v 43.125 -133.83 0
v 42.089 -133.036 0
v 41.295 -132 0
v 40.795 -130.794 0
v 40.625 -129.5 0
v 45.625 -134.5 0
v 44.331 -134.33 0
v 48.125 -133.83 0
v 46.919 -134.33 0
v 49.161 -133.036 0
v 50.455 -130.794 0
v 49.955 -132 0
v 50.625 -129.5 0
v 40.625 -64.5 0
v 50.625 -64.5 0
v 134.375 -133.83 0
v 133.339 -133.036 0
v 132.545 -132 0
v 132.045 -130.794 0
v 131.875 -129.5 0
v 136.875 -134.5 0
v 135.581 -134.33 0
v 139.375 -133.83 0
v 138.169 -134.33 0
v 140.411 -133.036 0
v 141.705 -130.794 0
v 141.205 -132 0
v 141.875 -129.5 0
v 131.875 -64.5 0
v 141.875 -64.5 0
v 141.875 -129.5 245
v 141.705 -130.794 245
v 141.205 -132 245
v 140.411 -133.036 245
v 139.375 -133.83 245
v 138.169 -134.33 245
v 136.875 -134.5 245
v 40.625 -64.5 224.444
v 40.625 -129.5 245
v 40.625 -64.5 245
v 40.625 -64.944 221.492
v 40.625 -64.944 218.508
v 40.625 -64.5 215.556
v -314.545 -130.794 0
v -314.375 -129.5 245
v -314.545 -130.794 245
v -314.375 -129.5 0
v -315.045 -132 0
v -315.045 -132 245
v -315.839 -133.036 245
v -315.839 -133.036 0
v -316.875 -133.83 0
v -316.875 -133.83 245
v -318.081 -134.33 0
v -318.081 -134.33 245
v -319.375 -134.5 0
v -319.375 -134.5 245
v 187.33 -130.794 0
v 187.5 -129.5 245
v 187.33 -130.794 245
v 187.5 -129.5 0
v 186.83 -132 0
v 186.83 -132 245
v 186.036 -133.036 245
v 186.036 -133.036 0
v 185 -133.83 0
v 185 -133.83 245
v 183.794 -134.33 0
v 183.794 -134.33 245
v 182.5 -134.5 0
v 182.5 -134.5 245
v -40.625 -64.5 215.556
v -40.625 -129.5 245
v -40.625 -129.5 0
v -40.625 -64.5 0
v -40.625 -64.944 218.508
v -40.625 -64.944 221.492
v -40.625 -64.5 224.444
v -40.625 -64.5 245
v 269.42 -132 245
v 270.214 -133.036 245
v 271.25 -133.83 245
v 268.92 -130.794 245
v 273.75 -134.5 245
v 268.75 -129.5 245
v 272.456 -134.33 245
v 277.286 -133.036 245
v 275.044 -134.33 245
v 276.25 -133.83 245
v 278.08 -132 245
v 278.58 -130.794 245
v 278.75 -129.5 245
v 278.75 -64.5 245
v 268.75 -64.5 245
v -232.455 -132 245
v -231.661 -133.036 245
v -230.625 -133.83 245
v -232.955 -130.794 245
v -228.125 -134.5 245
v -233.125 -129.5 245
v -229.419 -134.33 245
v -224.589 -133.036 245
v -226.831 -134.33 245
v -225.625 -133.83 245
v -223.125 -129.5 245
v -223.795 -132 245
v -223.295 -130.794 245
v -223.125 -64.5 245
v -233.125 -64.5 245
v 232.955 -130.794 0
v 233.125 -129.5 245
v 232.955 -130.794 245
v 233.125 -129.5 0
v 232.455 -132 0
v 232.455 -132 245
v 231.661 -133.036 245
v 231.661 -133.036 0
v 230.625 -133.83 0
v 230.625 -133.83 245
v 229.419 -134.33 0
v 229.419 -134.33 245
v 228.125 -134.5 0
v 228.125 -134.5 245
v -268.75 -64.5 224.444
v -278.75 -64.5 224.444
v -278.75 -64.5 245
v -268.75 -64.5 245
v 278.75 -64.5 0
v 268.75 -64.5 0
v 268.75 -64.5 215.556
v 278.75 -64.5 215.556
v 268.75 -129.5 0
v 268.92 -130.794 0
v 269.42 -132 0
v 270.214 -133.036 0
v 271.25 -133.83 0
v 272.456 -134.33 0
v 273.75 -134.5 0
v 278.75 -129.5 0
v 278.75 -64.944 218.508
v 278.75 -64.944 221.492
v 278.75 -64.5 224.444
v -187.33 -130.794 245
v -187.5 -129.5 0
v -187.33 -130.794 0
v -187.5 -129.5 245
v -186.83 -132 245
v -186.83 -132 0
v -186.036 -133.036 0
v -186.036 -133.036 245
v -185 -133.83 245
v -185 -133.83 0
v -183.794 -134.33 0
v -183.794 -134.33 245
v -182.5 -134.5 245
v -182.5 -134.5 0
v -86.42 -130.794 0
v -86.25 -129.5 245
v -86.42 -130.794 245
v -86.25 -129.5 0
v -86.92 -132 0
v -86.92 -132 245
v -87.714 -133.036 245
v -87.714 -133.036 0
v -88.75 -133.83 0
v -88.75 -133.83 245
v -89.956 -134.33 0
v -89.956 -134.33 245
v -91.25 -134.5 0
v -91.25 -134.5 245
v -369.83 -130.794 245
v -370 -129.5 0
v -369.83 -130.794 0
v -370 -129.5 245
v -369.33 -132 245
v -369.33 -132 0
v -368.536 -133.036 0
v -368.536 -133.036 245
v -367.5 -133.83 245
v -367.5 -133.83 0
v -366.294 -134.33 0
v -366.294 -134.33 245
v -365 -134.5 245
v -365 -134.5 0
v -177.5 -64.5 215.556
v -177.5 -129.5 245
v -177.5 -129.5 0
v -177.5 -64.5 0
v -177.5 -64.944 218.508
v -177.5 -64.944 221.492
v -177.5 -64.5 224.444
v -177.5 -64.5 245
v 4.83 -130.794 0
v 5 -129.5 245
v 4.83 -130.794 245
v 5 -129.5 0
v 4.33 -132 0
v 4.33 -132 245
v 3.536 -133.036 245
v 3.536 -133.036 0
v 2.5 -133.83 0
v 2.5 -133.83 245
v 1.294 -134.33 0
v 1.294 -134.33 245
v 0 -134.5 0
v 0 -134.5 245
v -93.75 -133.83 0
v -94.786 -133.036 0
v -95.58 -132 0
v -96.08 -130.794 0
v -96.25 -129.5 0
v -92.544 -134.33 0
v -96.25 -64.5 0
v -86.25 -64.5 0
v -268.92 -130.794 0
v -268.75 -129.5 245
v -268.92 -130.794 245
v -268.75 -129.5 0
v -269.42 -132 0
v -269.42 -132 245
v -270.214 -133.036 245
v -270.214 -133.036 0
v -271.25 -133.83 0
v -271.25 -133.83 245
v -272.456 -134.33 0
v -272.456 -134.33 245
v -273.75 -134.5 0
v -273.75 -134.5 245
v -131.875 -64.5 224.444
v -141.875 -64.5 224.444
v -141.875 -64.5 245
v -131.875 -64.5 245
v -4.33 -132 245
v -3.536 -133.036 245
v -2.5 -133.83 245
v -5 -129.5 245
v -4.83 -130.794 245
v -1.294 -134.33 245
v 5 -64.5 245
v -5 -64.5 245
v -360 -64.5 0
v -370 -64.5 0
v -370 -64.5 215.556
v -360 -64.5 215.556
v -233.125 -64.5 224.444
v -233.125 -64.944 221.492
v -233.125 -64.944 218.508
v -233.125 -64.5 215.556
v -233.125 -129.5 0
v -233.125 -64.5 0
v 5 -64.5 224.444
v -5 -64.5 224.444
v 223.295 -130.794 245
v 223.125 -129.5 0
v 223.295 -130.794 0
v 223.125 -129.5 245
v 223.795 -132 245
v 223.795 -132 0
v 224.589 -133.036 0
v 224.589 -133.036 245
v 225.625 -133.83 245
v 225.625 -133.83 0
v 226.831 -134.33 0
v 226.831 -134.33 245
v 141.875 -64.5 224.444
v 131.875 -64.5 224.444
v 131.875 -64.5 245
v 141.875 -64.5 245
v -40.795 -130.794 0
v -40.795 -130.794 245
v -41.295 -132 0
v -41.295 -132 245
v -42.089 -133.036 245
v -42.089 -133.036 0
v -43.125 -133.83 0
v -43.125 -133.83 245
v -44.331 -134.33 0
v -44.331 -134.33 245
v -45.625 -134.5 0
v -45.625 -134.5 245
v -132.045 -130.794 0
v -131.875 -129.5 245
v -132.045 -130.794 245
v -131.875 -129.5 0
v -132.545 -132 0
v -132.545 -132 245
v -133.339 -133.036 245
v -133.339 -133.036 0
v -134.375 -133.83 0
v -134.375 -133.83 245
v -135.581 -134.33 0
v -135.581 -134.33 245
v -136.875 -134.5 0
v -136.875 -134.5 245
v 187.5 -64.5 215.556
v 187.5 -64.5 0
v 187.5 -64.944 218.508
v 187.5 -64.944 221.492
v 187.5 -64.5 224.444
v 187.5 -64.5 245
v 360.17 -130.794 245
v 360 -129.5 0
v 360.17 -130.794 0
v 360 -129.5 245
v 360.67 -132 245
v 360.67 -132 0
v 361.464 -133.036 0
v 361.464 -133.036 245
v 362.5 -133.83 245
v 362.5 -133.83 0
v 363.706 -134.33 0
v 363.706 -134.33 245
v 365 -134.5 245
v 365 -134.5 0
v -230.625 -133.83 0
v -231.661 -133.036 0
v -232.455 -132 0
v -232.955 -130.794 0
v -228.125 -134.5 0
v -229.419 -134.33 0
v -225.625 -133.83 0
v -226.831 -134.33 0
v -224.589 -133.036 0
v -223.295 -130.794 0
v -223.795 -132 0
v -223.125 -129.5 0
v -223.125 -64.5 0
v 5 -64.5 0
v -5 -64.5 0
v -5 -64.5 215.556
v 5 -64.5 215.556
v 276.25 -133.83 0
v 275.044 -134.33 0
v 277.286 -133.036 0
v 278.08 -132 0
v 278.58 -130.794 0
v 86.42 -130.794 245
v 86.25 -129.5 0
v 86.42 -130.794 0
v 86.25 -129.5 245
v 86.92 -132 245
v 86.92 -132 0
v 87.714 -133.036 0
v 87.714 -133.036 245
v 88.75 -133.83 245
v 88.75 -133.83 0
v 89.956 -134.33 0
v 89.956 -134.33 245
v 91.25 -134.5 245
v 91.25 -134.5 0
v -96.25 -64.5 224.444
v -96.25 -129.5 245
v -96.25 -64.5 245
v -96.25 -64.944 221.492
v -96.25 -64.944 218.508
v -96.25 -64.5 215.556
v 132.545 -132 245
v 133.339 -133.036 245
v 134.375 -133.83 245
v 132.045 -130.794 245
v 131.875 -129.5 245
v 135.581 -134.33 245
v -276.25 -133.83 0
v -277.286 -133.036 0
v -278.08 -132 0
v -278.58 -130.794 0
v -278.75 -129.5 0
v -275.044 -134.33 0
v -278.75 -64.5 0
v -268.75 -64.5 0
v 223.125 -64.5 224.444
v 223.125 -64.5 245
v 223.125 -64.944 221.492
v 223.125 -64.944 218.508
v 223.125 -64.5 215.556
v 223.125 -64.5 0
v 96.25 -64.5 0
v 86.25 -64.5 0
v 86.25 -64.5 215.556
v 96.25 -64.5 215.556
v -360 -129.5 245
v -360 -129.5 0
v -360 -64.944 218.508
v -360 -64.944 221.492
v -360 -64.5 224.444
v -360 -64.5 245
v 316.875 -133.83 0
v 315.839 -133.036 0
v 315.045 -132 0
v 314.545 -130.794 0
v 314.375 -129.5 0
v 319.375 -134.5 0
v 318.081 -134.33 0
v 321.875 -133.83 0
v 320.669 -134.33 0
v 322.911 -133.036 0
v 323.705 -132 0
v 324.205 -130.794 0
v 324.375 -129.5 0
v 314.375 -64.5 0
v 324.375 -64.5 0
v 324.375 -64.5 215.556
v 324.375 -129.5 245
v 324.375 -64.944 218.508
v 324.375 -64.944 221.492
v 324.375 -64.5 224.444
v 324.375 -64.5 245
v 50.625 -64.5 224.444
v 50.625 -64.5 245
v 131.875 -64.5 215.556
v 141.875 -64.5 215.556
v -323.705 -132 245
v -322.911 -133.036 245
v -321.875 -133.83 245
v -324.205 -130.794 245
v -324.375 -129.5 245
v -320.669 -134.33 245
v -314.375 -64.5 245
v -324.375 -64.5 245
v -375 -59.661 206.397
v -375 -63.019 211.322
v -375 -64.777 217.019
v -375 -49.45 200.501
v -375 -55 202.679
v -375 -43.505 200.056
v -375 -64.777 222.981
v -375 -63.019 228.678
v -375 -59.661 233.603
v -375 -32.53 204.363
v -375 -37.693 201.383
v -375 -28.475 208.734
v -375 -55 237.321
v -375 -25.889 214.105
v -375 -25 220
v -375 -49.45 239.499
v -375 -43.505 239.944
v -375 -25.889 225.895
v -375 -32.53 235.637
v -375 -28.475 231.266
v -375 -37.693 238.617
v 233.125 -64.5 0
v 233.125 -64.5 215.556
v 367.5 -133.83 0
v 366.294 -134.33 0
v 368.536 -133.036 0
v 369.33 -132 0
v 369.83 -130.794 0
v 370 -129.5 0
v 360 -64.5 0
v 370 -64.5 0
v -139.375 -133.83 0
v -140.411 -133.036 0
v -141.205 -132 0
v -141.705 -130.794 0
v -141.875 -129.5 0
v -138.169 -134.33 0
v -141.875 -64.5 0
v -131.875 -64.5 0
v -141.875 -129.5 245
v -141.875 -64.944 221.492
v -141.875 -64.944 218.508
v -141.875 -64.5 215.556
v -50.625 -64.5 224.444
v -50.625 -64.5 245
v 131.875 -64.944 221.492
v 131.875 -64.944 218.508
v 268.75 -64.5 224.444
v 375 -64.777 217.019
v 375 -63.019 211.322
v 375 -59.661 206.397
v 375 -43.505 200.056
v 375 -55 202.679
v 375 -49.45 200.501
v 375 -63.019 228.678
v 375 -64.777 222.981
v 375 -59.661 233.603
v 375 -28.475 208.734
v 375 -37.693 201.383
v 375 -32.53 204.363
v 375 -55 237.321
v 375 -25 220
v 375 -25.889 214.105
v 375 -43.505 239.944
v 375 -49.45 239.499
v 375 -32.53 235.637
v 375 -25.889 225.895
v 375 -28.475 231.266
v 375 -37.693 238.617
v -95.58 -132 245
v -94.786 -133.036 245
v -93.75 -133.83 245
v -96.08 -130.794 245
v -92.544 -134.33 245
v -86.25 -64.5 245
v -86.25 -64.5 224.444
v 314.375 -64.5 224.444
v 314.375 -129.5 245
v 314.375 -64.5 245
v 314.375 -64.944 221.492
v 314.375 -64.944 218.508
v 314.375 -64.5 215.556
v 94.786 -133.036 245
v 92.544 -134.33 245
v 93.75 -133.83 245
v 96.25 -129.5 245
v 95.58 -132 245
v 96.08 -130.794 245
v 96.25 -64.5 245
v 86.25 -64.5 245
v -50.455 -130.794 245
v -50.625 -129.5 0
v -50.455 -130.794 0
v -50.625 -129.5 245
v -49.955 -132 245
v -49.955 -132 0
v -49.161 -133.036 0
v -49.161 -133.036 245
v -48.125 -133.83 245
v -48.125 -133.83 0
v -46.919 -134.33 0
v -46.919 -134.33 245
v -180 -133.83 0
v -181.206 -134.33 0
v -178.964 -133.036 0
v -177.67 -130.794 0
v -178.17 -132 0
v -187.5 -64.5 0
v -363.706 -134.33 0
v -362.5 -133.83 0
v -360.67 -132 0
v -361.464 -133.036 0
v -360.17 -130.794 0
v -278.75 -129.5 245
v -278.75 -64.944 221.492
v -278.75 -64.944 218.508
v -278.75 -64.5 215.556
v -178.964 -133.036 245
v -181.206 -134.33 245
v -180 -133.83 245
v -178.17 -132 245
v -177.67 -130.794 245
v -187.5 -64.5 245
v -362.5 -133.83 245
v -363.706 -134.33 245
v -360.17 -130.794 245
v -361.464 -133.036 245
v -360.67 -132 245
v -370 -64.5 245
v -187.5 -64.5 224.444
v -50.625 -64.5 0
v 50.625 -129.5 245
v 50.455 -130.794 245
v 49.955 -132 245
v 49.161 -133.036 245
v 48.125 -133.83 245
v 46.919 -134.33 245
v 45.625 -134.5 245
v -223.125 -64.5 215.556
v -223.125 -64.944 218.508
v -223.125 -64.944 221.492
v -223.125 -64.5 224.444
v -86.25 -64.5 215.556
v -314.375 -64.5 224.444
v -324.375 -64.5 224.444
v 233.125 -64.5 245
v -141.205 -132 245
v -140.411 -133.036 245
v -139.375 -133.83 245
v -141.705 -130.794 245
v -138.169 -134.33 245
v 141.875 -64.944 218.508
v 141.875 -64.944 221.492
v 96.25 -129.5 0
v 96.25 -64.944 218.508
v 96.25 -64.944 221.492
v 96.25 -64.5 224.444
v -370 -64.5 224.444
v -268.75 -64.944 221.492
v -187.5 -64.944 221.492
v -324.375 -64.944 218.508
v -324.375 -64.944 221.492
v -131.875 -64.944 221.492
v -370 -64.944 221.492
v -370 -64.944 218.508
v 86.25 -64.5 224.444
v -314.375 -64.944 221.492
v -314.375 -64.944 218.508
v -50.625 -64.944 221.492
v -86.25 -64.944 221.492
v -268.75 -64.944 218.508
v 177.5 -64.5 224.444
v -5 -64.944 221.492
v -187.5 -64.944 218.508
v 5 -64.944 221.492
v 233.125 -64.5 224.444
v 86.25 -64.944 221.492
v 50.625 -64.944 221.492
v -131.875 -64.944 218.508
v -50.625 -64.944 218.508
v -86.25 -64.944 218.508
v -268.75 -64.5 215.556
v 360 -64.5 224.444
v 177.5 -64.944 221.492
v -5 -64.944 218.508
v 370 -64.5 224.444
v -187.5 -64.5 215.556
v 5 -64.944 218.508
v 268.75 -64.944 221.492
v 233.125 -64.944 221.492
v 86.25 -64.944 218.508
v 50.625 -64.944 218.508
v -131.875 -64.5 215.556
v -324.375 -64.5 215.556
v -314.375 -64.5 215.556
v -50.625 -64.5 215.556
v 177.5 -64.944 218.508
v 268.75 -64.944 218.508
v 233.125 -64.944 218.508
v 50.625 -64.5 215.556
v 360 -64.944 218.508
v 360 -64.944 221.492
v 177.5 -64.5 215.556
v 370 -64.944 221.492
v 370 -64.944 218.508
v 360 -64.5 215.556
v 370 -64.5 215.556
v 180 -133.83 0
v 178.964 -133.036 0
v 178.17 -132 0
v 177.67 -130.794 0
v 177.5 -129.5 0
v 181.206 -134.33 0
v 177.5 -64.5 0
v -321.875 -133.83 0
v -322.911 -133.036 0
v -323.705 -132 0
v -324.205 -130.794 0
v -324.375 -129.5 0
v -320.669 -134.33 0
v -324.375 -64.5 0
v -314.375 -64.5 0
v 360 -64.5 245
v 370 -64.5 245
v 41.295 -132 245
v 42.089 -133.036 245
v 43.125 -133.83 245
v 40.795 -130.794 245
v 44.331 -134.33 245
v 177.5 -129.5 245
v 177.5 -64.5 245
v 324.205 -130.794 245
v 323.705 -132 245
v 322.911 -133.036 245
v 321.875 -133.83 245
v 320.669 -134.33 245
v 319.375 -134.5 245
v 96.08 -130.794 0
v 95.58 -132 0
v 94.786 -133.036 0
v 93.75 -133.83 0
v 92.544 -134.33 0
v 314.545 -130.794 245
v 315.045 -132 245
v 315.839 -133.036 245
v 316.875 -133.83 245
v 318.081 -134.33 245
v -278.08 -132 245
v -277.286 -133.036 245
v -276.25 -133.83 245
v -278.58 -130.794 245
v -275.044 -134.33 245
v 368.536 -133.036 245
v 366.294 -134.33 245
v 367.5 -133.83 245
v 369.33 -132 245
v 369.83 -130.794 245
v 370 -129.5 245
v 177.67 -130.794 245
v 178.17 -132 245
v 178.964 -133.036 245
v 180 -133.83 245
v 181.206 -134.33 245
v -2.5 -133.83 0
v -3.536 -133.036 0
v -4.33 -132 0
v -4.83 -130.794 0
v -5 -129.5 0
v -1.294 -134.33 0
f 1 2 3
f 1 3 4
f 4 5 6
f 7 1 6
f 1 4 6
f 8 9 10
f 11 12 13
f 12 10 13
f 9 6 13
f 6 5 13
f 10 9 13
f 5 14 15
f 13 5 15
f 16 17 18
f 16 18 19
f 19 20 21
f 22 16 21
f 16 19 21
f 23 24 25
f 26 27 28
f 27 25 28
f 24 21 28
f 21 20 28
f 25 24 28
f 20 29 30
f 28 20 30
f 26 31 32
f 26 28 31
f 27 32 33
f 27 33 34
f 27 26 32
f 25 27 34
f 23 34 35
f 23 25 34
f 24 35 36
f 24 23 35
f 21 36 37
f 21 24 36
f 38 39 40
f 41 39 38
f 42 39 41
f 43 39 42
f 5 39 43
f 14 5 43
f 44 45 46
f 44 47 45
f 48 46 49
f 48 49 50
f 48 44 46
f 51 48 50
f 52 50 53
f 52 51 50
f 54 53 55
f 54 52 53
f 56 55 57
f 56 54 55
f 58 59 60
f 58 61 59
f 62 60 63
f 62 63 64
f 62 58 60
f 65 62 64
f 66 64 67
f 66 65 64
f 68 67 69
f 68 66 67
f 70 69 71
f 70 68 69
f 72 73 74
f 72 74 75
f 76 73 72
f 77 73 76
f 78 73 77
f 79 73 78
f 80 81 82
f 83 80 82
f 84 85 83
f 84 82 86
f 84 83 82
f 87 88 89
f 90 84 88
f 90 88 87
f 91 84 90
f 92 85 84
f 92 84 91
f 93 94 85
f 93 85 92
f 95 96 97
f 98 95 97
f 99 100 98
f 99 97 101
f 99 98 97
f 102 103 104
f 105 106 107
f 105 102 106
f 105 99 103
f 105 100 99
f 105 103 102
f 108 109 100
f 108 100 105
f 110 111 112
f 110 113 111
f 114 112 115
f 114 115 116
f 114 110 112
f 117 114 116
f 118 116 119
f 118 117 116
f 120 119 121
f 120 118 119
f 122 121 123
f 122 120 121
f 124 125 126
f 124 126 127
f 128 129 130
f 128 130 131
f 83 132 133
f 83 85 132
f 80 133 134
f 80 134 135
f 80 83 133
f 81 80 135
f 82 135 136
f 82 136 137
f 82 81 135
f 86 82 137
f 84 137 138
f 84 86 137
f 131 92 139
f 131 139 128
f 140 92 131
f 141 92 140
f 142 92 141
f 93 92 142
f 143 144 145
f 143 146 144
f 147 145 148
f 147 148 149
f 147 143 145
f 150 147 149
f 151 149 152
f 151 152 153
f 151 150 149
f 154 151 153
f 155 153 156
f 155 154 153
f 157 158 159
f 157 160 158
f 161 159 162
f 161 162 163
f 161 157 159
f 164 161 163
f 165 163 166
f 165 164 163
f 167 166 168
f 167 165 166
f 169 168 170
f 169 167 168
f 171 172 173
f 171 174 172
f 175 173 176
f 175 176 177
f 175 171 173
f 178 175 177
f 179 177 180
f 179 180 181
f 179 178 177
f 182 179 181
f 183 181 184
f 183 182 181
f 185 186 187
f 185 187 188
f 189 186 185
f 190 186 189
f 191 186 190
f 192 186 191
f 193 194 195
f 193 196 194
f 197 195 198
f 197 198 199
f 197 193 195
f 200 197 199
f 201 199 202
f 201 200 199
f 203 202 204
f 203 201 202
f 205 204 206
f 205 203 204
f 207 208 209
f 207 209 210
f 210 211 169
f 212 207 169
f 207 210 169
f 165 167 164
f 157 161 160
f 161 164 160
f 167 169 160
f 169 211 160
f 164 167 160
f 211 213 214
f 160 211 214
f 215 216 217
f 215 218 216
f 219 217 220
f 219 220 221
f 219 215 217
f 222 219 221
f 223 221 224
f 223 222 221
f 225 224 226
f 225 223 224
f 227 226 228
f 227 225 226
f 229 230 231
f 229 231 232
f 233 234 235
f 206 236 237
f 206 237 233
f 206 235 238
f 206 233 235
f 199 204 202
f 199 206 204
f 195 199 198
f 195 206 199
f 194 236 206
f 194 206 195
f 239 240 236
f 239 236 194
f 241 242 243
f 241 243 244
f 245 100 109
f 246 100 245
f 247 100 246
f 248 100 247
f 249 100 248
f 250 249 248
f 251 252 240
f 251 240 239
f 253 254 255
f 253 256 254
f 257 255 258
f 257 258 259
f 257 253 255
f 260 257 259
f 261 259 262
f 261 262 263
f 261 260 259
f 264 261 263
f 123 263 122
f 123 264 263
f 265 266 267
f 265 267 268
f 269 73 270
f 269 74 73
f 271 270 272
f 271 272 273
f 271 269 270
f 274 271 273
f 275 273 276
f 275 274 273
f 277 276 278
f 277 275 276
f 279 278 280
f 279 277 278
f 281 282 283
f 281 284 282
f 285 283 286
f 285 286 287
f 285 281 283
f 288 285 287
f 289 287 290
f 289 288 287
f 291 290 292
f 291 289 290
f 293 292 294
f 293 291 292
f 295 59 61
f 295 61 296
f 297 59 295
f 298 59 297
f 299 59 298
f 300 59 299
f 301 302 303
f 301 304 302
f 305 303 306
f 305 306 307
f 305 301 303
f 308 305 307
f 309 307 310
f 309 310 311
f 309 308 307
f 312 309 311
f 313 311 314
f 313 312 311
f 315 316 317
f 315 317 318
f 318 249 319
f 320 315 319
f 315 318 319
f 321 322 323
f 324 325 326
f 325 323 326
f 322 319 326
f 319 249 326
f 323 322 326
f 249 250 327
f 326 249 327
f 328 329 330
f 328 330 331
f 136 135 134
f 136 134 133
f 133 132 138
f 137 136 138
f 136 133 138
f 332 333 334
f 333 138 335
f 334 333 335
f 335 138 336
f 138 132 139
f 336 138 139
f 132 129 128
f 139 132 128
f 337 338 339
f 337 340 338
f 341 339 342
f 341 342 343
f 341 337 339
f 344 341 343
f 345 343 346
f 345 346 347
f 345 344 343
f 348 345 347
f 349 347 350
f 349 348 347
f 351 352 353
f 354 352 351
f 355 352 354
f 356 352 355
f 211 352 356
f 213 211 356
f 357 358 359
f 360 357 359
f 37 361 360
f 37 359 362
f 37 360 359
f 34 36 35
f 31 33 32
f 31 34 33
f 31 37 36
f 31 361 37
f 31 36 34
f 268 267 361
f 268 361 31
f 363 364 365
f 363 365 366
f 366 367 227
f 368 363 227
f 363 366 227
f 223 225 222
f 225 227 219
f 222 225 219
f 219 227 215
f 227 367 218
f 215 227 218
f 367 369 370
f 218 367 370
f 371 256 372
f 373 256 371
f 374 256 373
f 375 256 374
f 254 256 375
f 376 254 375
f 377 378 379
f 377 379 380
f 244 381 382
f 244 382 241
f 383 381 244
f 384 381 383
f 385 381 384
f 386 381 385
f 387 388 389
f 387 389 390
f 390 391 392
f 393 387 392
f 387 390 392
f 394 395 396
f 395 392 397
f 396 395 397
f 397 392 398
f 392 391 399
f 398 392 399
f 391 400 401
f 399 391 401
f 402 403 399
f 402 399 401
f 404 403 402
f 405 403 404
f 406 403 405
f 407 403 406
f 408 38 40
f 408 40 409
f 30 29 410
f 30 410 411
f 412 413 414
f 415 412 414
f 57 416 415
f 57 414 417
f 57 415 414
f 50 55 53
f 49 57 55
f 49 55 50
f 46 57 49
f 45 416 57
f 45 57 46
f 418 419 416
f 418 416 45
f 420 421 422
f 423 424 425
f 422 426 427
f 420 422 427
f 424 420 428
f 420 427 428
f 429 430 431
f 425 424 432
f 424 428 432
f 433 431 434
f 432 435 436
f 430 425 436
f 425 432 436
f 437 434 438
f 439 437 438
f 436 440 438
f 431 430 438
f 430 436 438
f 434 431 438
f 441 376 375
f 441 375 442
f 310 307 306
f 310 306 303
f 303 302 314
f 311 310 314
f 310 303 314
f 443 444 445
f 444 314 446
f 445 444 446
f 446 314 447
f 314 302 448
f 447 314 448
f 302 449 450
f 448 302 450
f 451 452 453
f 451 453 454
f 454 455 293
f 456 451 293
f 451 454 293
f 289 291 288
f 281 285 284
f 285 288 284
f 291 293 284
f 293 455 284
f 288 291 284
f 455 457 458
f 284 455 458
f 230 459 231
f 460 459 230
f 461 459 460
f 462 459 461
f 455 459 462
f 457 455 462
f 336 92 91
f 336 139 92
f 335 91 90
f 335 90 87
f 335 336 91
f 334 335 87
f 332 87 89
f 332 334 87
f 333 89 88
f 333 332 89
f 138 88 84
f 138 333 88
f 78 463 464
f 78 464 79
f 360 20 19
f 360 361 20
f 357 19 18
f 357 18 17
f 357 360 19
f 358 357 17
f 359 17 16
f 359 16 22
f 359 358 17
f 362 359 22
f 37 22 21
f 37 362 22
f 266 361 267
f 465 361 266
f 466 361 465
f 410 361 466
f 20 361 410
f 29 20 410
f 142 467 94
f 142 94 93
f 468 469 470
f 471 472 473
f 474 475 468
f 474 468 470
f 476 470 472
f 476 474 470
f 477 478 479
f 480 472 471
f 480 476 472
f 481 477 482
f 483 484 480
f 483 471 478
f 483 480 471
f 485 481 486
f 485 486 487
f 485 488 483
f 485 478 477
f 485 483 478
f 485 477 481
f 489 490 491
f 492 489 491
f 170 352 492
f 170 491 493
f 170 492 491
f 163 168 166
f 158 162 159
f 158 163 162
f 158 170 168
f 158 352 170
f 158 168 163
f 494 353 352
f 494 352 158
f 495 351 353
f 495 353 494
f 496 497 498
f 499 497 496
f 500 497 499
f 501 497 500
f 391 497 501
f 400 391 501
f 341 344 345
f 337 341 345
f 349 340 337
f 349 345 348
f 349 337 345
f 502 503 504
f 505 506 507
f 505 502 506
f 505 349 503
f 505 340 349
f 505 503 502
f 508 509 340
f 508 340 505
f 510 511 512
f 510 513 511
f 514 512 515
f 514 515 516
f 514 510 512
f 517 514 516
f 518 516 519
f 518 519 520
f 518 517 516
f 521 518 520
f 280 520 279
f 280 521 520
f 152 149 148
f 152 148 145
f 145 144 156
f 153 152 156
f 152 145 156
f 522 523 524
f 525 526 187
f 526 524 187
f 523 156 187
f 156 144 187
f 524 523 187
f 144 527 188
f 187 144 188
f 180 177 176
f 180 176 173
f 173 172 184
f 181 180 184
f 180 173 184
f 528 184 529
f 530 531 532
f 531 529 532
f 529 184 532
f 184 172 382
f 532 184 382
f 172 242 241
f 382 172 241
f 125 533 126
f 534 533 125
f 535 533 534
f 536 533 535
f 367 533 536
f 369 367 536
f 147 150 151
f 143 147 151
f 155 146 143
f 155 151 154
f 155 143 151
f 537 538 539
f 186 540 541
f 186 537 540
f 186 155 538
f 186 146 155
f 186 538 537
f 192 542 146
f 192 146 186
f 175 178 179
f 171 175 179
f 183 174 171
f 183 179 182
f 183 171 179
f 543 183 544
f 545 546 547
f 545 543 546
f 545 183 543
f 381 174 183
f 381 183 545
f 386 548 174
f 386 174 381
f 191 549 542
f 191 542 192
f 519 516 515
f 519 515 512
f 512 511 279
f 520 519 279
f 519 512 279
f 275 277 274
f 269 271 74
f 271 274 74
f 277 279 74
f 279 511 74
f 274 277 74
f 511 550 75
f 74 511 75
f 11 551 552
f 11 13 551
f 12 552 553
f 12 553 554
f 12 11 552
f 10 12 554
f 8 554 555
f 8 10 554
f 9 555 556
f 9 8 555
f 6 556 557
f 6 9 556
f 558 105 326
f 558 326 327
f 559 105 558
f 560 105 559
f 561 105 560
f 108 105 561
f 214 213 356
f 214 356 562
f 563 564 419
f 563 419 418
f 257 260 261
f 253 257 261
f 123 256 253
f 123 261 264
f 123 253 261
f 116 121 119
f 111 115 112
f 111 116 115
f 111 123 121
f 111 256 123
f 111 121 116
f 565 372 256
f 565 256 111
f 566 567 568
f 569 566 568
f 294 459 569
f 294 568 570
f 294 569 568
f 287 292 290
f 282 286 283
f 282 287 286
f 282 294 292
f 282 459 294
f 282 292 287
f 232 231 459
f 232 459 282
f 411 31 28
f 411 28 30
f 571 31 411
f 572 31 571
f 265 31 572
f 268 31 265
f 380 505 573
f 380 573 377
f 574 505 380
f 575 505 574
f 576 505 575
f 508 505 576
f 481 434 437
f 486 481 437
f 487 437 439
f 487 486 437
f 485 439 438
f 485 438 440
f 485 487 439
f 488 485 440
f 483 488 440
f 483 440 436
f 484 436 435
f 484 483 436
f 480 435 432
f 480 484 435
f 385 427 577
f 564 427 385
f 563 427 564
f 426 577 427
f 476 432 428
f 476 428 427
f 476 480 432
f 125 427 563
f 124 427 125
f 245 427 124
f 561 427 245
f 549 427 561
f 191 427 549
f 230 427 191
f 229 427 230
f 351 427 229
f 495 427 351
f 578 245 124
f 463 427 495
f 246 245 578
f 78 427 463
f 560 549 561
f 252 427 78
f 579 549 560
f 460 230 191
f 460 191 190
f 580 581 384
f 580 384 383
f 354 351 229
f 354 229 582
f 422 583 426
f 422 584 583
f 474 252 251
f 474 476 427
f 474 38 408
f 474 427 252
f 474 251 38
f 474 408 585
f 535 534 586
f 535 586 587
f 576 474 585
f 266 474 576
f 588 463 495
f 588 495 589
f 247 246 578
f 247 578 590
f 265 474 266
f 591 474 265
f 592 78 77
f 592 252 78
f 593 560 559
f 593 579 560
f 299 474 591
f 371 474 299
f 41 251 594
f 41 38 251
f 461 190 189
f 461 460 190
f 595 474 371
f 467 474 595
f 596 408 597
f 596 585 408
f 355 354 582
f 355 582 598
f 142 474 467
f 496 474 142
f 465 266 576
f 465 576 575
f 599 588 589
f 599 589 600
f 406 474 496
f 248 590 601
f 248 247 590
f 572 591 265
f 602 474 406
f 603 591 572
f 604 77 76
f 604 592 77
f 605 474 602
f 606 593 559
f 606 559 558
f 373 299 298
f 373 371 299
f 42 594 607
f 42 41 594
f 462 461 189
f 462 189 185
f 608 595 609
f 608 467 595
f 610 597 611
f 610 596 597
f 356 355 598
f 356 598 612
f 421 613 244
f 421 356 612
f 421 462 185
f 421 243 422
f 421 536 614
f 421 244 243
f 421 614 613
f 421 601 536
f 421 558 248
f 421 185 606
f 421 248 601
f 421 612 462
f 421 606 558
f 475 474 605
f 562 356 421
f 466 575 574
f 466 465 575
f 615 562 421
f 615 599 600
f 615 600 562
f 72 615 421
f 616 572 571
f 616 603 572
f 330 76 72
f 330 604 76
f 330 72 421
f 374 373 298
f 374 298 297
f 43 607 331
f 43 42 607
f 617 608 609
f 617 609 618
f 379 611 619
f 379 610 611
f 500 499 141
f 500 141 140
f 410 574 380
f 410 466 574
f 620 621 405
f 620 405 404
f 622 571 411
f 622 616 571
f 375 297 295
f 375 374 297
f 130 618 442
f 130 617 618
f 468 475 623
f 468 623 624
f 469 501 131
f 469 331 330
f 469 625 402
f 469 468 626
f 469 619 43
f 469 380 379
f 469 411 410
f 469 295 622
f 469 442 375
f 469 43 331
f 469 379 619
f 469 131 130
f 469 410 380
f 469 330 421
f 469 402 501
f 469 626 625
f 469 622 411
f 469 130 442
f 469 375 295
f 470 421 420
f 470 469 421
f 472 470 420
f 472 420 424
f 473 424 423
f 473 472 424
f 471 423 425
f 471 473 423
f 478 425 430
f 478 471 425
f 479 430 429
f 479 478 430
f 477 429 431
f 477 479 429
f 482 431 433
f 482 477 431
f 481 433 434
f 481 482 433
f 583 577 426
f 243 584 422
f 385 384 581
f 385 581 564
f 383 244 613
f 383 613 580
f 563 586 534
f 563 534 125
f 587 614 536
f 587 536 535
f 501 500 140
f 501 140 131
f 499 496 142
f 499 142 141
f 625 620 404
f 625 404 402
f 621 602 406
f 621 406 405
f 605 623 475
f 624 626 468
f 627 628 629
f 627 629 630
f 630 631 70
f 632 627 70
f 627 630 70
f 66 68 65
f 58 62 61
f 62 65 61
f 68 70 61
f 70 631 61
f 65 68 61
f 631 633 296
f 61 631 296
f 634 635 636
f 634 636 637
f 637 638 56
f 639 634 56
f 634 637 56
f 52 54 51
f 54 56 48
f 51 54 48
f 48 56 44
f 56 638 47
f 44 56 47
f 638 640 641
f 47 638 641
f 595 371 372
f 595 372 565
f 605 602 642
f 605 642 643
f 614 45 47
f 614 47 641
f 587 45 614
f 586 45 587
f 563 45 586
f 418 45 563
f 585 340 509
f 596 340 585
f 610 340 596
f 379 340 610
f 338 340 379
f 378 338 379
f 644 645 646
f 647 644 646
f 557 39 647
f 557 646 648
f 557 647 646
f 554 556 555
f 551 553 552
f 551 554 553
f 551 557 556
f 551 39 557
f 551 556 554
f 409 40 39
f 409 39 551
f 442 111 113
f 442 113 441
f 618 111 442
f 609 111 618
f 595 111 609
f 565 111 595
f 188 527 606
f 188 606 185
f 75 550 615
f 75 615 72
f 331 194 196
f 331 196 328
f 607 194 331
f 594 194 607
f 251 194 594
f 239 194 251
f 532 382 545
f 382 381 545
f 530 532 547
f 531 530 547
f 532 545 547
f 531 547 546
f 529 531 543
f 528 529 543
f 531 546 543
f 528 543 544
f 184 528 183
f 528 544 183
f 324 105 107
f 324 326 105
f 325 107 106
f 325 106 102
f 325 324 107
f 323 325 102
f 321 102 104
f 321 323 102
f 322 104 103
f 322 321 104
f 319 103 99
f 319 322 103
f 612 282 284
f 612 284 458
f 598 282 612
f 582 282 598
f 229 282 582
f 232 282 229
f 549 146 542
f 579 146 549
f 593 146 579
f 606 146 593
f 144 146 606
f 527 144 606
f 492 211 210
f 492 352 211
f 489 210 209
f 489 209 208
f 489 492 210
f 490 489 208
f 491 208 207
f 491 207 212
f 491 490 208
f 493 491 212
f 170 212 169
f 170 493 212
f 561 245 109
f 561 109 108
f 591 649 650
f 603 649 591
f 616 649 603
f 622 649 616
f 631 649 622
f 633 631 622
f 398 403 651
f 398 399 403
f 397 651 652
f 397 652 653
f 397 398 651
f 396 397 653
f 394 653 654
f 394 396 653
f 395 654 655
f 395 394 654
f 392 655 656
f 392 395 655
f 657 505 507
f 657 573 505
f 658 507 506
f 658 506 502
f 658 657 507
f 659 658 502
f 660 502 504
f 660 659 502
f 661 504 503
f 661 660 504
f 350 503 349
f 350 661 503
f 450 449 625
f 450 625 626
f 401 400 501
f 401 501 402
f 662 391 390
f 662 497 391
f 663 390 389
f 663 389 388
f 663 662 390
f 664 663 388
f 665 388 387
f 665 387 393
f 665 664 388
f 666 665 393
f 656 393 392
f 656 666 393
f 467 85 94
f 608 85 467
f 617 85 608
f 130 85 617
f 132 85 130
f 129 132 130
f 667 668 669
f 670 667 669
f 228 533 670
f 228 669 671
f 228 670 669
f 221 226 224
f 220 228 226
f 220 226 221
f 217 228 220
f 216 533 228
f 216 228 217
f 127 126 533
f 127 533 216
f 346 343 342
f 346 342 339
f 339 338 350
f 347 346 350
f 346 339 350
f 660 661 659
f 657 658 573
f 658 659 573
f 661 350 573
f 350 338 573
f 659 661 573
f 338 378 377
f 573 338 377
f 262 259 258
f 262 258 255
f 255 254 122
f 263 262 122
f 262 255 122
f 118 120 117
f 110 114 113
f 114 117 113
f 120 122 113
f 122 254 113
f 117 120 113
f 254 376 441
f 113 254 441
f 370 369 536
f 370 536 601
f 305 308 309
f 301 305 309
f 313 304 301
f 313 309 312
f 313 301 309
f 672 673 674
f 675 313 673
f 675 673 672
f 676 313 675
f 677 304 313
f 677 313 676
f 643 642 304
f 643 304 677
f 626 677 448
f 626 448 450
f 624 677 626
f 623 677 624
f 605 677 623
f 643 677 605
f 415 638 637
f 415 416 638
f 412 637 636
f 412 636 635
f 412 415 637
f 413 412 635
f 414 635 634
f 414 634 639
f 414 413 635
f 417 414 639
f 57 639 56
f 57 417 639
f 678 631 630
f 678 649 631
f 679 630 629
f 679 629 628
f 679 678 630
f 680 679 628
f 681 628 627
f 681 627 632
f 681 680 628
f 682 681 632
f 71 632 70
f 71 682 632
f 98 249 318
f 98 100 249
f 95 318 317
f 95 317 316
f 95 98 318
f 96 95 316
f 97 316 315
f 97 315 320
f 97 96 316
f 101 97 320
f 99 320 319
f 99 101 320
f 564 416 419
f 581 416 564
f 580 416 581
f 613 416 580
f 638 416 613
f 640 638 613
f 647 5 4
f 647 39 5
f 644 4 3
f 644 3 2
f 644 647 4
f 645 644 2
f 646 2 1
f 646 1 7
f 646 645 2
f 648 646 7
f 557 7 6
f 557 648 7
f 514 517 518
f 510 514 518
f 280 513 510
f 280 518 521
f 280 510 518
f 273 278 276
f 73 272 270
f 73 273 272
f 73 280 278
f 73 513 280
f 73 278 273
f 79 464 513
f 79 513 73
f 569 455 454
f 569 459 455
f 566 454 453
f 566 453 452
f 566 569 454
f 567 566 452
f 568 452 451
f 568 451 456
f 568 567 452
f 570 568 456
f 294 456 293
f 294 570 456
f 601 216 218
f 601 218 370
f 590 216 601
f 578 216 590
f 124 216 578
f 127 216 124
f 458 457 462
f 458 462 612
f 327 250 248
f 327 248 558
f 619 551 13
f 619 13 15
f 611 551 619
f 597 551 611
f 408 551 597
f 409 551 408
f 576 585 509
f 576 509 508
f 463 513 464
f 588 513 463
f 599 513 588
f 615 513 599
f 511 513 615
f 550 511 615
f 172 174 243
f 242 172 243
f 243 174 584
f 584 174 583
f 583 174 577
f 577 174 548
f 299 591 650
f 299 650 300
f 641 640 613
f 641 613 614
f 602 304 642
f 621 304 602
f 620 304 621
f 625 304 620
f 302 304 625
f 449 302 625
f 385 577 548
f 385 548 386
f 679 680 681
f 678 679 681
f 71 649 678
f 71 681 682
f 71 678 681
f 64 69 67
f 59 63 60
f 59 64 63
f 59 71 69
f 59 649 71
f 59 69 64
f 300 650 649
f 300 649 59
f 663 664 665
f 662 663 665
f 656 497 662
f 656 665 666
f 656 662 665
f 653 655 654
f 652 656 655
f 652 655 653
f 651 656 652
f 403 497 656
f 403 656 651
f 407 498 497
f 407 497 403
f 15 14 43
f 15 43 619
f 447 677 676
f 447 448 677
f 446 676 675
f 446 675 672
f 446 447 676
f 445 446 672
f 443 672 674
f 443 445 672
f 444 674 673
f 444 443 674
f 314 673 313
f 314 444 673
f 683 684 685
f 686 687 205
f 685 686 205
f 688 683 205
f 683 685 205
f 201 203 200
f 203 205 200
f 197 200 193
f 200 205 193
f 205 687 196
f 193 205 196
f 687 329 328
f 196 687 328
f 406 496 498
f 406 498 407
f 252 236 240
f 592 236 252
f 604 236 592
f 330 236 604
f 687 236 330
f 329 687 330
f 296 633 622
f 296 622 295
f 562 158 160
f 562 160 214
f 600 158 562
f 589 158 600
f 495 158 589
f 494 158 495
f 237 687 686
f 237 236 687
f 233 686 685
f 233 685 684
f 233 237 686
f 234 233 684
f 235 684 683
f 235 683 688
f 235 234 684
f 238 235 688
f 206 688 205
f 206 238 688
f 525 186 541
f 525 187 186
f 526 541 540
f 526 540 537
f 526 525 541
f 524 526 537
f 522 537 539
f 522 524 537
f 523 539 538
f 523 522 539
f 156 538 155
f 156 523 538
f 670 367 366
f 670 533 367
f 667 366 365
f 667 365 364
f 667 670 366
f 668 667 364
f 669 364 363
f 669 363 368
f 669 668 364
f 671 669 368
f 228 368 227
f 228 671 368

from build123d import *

# Parameters (mm, degrees)
F0_R          = 20
F1_DEPTH      = 375
F3_W          = 10
F3_H          = 70
F4_DEPTH      = 25
F4_DEPTH_BACK = 220
F5_R          = 4.99999
F6_R          = 4.99999


# Not quite as in the source:
# - a fillet or chamfer is up to 0.001 mm smaller than in the source, because OpenCascade refuses the exact size
# - a feature names something its author has since deleted; it is built from what else it names


with BuildPart() as f1:
    # F0 (on Right) → F1 (new body, symmetric)
    with BuildSketch(Plane.YZ):
        with Locations((-45, 220)):
            Circle(F0_R)
    extrude(amount=F1_DEPTH, both=True)

    # F3 (on plane+point) → F4 (join, two sides)
    with BuildSketch(Plane.XY.offset(220)) as f4_sk:
        with Locations((-365, -99.5)):
            Rectangle(F3_W, F3_H)
        with Locations((-319.375, -99.5)):
            Rectangle(F3_W, F3_H)
        with Locations((-273.75, -99.5)):
            Rectangle(F3_W, F3_H)
        with Locations((-228.125, -99.5)):
            Rectangle(F3_W, F3_H)
        with Locations((-182.5, -99.5)):
            Rectangle(F3_W, F3_H)
        with Locations((-136.875, -99.5)):
            Rectangle(F3_W, F3_H)
        with Locations((-91.25, -99.5)):
            Rectangle(F3_W, F3_H)
        with Locations((-45.625, -99.5)):
            Rectangle(F3_W, F3_H)
        with Locations((0, -99.5)):
            Rectangle(F3_W, F3_H)
        with Locations((45.625, -99.5)):
            Rectangle(F3_W, F3_H)
        with Locations((91.25, -99.5)):
            Rectangle(F3_W, F3_H)
        with Locations((136.875, -99.5)):
            Rectangle(F3_W, F3_H)
        with Locations((182.5, -99.5)):
            Rectangle(F3_W, F3_H)
        with Locations((228.125, -99.5)):
            Rectangle(F3_W, F3_H)
        with Locations((273.75, -99.5)):
            Rectangle(F3_W, F3_H)
        with Locations((319.375, -99.5)):
            Rectangle(F3_W, F3_H)
        with Locations((365, -99.5)):
            Rectangle(F3_W, F3_H)
    extrude(amount=F4_DEPTH)
    extrude(f4_sk.sketch, amount=-F4_DEPTH_BACK)

    # F5 (radius 5 in the source; OpenCascade refuses exactly that, so slightly less here)
    f5_edges = [f1.edges().sort_by_distance(p)[0] for p in [
        (-360, -134.5, 122.5),
        (-370, -134.5, 122.5),
    ]]
    fillet(f5_edges, radius=F5_R)

    # F6 (radius 5 in the source; OpenCascade refuses exactly that, so slightly less here)
    f6_edges = [f1.edges().sort_by_distance(p)[0] for p in [
        (-324.375, -134.5, 122.5),
        (-314.375, -134.5, 122.5),
        (-278.75, -134.5, 122.5),
        (-268.75, -134.5, 122.5),
        (-223.125, -134.5, 122.5),
        (-233.125, -134.5, 122.5),
        (-177.5, -134.5, 122.5),
        (-187.5, -134.5, 122.5),
        (-131.875, -134.5, 122.5),
        (-141.875, -134.5, 122.5),
        (-86.25, -134.5, 122.5),
        (-96.25, -134.5, 122.5),
        (-40.625, -134.5, 122.5),
        (-50.625, -134.5, 122.5),
        (5, -134.5, 122.5),
        (-5, -134.5, 122.5),
        (50.625, -134.5, 122.5),
        (40.625, -134.5, 122.5),
        (86.25, -134.5, 122.5),
        (96.25, -134.5, 122.5),
        (131.875, -134.5, 122.5),
        (141.875, -134.5, 122.5),
        (187.5, -134.5, 122.5),
        (177.5, -134.5, 122.5),
        (233.125, -134.5, 122.5),
        (223.125, -134.5, 122.5),
        (278.75, -134.5, 122.5),
        (268.75, -134.5, 122.5),
        (324.375, -134.5, 122.5),
        (314.375, -134.5, 122.5),
        (370, -134.5, 122.5),
        (360, -134.5, 122.5),
    ]]
    fillet(f6_edges, radius=F6_R)


solid = f1.part
